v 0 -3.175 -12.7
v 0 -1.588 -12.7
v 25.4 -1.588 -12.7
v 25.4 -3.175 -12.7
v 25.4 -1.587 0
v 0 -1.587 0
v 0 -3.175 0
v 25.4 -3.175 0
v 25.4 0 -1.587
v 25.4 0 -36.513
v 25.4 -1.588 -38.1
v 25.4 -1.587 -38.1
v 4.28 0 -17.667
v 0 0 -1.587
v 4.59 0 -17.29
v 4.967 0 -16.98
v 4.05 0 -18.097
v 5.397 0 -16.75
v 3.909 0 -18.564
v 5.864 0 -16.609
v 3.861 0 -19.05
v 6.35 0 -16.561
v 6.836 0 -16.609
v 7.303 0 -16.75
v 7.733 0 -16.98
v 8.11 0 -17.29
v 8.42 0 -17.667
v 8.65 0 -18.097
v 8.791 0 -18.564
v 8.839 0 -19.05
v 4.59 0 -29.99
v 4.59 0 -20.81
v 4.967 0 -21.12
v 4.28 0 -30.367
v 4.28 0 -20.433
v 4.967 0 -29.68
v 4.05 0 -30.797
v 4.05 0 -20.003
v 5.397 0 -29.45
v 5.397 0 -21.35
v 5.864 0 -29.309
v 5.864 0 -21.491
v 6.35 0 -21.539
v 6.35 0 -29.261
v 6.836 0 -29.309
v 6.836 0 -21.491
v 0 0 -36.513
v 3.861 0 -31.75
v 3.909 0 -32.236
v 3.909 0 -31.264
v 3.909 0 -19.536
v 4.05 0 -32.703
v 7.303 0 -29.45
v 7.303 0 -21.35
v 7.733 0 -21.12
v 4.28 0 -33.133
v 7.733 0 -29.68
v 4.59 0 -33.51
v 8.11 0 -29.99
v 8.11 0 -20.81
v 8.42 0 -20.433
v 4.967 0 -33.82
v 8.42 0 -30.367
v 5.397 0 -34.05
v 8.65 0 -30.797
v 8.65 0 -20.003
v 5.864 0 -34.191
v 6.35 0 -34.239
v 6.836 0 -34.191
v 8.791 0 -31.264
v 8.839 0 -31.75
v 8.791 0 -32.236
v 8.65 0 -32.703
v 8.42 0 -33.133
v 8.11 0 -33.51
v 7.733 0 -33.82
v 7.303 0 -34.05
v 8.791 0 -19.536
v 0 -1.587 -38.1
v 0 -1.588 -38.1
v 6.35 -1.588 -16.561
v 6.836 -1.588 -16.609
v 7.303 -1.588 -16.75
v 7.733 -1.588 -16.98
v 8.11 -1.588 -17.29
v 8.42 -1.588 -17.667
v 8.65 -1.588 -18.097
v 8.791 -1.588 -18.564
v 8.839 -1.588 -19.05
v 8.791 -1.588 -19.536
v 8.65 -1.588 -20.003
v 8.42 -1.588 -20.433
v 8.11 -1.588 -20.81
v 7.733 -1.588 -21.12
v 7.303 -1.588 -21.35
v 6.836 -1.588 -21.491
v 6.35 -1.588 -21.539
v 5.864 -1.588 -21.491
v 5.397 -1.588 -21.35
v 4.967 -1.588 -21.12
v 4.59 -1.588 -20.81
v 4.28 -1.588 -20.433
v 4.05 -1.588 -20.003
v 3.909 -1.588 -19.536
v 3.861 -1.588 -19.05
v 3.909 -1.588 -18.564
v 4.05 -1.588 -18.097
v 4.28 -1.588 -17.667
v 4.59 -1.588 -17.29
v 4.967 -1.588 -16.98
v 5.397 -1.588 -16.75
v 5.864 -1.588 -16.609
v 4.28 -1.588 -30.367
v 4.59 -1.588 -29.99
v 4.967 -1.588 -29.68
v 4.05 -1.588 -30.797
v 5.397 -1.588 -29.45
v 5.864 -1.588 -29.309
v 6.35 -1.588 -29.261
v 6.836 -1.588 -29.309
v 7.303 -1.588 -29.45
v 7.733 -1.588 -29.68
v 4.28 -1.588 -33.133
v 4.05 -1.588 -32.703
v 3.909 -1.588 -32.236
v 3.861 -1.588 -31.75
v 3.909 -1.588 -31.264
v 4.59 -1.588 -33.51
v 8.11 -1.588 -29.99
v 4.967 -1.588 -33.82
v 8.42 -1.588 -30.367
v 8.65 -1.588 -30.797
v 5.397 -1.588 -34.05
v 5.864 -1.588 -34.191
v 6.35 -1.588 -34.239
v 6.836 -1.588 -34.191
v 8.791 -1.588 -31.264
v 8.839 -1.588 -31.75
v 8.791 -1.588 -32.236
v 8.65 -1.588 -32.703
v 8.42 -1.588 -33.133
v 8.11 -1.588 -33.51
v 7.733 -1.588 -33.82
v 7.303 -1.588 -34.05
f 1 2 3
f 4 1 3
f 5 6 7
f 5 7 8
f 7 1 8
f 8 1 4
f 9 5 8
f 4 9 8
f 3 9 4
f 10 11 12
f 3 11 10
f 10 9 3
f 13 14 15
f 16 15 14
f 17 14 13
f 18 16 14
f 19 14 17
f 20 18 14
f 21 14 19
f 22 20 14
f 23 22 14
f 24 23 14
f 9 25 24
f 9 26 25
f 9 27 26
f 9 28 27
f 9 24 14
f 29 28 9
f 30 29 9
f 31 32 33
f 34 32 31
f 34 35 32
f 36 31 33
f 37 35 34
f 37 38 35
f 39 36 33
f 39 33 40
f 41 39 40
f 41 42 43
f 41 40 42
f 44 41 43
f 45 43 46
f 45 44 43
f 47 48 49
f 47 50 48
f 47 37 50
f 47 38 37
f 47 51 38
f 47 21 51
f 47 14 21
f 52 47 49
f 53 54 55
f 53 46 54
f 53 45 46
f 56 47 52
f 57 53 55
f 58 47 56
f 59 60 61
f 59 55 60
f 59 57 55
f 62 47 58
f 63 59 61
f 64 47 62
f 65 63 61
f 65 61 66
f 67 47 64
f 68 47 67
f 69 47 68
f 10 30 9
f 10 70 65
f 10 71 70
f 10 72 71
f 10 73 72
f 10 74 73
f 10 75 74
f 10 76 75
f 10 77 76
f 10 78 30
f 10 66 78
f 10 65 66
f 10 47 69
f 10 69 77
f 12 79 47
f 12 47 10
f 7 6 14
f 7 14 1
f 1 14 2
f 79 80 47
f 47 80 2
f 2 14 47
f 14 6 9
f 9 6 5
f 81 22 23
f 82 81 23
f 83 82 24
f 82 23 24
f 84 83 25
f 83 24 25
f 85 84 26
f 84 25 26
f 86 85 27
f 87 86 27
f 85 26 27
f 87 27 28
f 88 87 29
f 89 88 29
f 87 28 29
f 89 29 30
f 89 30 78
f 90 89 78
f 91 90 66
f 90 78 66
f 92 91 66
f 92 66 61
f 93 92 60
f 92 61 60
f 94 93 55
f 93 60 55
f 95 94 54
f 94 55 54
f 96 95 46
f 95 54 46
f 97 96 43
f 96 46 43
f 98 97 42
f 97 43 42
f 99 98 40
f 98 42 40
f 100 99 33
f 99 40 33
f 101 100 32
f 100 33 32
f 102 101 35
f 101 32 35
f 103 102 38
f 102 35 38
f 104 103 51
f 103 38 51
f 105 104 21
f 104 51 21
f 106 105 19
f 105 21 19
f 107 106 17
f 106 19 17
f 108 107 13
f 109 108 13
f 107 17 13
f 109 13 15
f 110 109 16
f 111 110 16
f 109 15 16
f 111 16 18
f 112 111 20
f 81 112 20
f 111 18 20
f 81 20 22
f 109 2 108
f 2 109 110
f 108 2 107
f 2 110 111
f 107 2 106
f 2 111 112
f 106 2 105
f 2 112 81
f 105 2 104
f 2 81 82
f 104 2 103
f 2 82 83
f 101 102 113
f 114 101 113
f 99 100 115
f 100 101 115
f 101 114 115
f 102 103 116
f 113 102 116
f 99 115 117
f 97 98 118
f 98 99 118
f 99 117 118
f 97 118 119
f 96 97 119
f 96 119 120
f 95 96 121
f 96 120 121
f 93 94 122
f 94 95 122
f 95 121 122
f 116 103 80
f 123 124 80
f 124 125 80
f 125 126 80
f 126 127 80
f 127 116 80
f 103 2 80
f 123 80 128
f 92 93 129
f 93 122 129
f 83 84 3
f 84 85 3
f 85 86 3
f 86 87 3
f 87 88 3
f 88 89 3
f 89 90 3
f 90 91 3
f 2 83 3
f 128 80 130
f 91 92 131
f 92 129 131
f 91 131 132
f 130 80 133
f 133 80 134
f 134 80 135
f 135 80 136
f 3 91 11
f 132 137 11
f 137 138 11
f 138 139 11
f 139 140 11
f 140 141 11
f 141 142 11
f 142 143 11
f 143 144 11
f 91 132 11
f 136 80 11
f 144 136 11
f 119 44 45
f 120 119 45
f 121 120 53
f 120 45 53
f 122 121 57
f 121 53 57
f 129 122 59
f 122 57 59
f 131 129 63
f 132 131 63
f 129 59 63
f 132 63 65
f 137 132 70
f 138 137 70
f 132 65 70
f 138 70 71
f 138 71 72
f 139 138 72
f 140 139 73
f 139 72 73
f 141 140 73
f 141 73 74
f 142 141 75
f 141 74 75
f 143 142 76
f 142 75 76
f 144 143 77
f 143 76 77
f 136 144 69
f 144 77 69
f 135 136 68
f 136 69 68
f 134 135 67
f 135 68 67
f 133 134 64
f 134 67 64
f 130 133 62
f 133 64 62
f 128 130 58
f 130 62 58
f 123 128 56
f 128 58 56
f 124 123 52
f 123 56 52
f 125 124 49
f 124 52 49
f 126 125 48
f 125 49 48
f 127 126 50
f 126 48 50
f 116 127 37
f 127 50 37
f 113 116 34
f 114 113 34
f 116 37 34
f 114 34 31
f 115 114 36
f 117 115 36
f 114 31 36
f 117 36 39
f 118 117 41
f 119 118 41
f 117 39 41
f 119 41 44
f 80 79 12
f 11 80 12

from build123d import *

# Parameters (mm, degrees)
SKETCH1_W           = 25.4
SKETCH1_H           = 25.4
SKETCH1_R           = 2.4892
BOSS_EXTRUDE1_DEPTH = 1.5875
SKETCH1_3_W         = 25.4
SKETCH1_3_H         = 12.7
BOSS_EXTRUDE2_DEPTH = 3.175
CHAMFER1_SIZE       = 1.5875


with BuildPart() as part:
    # Sketch1 → Boss-Extrude1 (new body)
    with BuildSketch(Plane(origin=(0, 0, 0), x_dir=(1, 0, 0), z_dir=(0, 1, 0))):
        with Locations((12.7, 25.4)):
            Rectangle(SKETCH1_W, SKETCH1_H)
        with Locations(Location((6.35, 19.05, 0), (0, 0, 270))):
            Circle(SKETCH1_R, mode=Mode.SUBTRACT)
        with Locations(Location((6.35, 31.75, 0), (0, 0, 270))):
            Circle(SKETCH1_R, mode=Mode.SUBTRACT)
    extrude(amount=-BOSS_EXTRUDE1_DEPTH)

    # Sketch1<3> → Boss-Extrude2 (add)
    with BuildSketch(Plane(origin=(0, 0, 0), x_dir=(1, 0, 0), z_dir=(0, 1, 0))):
        with Locations((12.7, 6.35)):
            Rectangle(SKETCH1_3_W, SKETCH1_3_H)
    extrude(amount=-BOSS_EXTRUDE2_DEPTH)

    # Chamfer1
    chamfer1_edges = [part.edges().sort_by_distance(p)[0] for p in [
        (12.7, 0, -38.1),
        (12.7, 0, 0),
    ]]
    chamfer(chamfer1_edges, length=CHAMFER1_SIZE - 0.0001)  # a hair under: the kernel refuses the full size


solid = part.part
